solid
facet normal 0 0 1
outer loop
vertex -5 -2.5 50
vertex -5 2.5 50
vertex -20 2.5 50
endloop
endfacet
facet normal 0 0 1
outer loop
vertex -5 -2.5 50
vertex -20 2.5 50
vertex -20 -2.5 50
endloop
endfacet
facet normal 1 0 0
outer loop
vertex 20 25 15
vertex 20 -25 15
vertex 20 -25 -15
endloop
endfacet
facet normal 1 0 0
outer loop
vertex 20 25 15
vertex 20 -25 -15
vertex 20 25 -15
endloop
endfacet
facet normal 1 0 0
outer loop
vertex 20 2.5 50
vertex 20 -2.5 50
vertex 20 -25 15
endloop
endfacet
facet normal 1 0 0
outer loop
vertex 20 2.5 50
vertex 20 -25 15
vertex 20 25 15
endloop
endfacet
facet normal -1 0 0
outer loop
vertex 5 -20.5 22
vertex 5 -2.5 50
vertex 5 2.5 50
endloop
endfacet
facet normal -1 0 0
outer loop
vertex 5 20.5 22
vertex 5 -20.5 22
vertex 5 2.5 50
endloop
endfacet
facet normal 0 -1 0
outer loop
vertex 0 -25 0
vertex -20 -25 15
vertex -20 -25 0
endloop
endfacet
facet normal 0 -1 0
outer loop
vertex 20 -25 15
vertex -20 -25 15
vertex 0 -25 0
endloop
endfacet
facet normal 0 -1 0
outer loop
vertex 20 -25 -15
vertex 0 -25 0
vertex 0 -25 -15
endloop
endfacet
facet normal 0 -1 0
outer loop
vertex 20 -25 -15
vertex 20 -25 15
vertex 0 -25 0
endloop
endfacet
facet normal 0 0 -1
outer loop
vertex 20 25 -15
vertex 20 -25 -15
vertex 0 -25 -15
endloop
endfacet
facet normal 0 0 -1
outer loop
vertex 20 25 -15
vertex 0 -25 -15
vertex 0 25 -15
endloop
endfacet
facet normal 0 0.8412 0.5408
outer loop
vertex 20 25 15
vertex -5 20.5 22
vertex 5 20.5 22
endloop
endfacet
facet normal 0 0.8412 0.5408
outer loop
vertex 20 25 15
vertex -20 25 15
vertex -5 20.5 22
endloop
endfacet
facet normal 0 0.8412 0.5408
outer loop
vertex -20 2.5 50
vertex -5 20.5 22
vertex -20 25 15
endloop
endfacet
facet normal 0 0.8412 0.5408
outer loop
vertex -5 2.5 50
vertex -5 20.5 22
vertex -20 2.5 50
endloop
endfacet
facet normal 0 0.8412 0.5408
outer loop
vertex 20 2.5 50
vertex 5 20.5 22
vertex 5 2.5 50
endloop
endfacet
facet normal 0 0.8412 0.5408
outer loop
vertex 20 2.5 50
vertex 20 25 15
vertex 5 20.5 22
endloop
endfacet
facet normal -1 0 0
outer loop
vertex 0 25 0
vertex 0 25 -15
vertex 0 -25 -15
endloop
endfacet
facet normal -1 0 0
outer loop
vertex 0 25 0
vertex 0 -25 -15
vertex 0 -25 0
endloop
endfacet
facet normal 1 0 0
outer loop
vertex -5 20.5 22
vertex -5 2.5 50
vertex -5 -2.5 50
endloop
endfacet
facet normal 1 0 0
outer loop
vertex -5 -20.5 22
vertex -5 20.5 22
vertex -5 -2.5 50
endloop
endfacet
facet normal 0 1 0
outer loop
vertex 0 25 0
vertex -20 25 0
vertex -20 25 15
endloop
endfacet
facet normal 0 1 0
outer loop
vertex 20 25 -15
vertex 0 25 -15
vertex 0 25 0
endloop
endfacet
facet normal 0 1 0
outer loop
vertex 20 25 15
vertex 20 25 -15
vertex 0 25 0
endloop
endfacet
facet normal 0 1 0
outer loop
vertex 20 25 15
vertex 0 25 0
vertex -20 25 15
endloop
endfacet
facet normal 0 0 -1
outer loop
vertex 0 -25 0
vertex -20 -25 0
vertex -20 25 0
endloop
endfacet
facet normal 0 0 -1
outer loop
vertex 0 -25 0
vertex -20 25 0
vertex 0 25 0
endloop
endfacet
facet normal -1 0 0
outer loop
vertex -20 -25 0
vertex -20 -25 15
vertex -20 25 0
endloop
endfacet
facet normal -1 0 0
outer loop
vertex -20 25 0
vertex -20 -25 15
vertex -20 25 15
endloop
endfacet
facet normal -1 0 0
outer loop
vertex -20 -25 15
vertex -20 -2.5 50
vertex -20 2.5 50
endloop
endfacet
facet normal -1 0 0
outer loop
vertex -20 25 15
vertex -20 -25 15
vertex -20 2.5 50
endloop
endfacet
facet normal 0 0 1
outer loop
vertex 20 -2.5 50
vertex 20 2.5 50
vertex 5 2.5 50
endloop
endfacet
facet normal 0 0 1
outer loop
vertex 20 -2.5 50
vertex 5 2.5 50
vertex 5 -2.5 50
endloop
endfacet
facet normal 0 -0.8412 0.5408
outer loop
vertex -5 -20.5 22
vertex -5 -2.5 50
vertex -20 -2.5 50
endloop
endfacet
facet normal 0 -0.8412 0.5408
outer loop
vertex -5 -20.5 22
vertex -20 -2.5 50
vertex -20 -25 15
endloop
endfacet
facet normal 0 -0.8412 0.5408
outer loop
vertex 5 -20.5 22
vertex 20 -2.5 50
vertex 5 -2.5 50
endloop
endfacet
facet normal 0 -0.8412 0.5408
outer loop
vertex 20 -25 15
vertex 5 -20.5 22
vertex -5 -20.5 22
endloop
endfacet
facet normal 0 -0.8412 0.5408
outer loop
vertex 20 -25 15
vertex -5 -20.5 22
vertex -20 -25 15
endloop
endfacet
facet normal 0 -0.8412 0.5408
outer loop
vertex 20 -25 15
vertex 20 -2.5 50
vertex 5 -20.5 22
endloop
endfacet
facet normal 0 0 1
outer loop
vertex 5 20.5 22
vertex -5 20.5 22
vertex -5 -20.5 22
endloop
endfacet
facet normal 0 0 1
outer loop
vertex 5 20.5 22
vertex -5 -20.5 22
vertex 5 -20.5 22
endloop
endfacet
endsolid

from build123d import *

# Parameters (mm, degrees)
F1_DEPTH = 20
F2_W     = 20
F2_H     = 15
F3_DEPTH = 50.001
F4_W     = 10
F4_H     = 22.5
F4_H_2   = 5
F5_DEPTH = 28


with BuildPart() as f1:
    # F0 (on Right) → F1 (new body, symmetric)
    with BuildSketch(Plane.YZ):
        Polygon((-25, 15), (0, 15), (0, 50), (-2.5, 50), align=None)
        Polygon((25, -15), (25, 15), (0, 15), (-25, 15), (-25, -15), align=None)
        Polygon((0, 15), (25, 15), (2.5, 50), (0, 50), align=None)
    extrude(amount=F1_DEPTH, both=True)

    # F2 (on face) → F3 (cut, through all)
    with BuildSketch(Plane.XZ.offset(25)):
        with Locations((-10, -7.5)):
            Rectangle(F2_W, F2_H)
    extrude(amount=-F3_DEPTH, mode=Mode.SUBTRACT)

    # F4 (on face) → F5 (cut)
    with BuildSketch(Plane.XY.offset(50)):
        with Locations((0, -13.75)):
            Rectangle(F4_W, F4_H)
        Rectangle(F4_W, F4_H_2)
        with Locations((0, 13.75)):
            Rectangle(F4_W, F4_H)
    extrude(amount=-F5_DEPTH, mode=Mode.SUBTRACT)


solid = f1.part
